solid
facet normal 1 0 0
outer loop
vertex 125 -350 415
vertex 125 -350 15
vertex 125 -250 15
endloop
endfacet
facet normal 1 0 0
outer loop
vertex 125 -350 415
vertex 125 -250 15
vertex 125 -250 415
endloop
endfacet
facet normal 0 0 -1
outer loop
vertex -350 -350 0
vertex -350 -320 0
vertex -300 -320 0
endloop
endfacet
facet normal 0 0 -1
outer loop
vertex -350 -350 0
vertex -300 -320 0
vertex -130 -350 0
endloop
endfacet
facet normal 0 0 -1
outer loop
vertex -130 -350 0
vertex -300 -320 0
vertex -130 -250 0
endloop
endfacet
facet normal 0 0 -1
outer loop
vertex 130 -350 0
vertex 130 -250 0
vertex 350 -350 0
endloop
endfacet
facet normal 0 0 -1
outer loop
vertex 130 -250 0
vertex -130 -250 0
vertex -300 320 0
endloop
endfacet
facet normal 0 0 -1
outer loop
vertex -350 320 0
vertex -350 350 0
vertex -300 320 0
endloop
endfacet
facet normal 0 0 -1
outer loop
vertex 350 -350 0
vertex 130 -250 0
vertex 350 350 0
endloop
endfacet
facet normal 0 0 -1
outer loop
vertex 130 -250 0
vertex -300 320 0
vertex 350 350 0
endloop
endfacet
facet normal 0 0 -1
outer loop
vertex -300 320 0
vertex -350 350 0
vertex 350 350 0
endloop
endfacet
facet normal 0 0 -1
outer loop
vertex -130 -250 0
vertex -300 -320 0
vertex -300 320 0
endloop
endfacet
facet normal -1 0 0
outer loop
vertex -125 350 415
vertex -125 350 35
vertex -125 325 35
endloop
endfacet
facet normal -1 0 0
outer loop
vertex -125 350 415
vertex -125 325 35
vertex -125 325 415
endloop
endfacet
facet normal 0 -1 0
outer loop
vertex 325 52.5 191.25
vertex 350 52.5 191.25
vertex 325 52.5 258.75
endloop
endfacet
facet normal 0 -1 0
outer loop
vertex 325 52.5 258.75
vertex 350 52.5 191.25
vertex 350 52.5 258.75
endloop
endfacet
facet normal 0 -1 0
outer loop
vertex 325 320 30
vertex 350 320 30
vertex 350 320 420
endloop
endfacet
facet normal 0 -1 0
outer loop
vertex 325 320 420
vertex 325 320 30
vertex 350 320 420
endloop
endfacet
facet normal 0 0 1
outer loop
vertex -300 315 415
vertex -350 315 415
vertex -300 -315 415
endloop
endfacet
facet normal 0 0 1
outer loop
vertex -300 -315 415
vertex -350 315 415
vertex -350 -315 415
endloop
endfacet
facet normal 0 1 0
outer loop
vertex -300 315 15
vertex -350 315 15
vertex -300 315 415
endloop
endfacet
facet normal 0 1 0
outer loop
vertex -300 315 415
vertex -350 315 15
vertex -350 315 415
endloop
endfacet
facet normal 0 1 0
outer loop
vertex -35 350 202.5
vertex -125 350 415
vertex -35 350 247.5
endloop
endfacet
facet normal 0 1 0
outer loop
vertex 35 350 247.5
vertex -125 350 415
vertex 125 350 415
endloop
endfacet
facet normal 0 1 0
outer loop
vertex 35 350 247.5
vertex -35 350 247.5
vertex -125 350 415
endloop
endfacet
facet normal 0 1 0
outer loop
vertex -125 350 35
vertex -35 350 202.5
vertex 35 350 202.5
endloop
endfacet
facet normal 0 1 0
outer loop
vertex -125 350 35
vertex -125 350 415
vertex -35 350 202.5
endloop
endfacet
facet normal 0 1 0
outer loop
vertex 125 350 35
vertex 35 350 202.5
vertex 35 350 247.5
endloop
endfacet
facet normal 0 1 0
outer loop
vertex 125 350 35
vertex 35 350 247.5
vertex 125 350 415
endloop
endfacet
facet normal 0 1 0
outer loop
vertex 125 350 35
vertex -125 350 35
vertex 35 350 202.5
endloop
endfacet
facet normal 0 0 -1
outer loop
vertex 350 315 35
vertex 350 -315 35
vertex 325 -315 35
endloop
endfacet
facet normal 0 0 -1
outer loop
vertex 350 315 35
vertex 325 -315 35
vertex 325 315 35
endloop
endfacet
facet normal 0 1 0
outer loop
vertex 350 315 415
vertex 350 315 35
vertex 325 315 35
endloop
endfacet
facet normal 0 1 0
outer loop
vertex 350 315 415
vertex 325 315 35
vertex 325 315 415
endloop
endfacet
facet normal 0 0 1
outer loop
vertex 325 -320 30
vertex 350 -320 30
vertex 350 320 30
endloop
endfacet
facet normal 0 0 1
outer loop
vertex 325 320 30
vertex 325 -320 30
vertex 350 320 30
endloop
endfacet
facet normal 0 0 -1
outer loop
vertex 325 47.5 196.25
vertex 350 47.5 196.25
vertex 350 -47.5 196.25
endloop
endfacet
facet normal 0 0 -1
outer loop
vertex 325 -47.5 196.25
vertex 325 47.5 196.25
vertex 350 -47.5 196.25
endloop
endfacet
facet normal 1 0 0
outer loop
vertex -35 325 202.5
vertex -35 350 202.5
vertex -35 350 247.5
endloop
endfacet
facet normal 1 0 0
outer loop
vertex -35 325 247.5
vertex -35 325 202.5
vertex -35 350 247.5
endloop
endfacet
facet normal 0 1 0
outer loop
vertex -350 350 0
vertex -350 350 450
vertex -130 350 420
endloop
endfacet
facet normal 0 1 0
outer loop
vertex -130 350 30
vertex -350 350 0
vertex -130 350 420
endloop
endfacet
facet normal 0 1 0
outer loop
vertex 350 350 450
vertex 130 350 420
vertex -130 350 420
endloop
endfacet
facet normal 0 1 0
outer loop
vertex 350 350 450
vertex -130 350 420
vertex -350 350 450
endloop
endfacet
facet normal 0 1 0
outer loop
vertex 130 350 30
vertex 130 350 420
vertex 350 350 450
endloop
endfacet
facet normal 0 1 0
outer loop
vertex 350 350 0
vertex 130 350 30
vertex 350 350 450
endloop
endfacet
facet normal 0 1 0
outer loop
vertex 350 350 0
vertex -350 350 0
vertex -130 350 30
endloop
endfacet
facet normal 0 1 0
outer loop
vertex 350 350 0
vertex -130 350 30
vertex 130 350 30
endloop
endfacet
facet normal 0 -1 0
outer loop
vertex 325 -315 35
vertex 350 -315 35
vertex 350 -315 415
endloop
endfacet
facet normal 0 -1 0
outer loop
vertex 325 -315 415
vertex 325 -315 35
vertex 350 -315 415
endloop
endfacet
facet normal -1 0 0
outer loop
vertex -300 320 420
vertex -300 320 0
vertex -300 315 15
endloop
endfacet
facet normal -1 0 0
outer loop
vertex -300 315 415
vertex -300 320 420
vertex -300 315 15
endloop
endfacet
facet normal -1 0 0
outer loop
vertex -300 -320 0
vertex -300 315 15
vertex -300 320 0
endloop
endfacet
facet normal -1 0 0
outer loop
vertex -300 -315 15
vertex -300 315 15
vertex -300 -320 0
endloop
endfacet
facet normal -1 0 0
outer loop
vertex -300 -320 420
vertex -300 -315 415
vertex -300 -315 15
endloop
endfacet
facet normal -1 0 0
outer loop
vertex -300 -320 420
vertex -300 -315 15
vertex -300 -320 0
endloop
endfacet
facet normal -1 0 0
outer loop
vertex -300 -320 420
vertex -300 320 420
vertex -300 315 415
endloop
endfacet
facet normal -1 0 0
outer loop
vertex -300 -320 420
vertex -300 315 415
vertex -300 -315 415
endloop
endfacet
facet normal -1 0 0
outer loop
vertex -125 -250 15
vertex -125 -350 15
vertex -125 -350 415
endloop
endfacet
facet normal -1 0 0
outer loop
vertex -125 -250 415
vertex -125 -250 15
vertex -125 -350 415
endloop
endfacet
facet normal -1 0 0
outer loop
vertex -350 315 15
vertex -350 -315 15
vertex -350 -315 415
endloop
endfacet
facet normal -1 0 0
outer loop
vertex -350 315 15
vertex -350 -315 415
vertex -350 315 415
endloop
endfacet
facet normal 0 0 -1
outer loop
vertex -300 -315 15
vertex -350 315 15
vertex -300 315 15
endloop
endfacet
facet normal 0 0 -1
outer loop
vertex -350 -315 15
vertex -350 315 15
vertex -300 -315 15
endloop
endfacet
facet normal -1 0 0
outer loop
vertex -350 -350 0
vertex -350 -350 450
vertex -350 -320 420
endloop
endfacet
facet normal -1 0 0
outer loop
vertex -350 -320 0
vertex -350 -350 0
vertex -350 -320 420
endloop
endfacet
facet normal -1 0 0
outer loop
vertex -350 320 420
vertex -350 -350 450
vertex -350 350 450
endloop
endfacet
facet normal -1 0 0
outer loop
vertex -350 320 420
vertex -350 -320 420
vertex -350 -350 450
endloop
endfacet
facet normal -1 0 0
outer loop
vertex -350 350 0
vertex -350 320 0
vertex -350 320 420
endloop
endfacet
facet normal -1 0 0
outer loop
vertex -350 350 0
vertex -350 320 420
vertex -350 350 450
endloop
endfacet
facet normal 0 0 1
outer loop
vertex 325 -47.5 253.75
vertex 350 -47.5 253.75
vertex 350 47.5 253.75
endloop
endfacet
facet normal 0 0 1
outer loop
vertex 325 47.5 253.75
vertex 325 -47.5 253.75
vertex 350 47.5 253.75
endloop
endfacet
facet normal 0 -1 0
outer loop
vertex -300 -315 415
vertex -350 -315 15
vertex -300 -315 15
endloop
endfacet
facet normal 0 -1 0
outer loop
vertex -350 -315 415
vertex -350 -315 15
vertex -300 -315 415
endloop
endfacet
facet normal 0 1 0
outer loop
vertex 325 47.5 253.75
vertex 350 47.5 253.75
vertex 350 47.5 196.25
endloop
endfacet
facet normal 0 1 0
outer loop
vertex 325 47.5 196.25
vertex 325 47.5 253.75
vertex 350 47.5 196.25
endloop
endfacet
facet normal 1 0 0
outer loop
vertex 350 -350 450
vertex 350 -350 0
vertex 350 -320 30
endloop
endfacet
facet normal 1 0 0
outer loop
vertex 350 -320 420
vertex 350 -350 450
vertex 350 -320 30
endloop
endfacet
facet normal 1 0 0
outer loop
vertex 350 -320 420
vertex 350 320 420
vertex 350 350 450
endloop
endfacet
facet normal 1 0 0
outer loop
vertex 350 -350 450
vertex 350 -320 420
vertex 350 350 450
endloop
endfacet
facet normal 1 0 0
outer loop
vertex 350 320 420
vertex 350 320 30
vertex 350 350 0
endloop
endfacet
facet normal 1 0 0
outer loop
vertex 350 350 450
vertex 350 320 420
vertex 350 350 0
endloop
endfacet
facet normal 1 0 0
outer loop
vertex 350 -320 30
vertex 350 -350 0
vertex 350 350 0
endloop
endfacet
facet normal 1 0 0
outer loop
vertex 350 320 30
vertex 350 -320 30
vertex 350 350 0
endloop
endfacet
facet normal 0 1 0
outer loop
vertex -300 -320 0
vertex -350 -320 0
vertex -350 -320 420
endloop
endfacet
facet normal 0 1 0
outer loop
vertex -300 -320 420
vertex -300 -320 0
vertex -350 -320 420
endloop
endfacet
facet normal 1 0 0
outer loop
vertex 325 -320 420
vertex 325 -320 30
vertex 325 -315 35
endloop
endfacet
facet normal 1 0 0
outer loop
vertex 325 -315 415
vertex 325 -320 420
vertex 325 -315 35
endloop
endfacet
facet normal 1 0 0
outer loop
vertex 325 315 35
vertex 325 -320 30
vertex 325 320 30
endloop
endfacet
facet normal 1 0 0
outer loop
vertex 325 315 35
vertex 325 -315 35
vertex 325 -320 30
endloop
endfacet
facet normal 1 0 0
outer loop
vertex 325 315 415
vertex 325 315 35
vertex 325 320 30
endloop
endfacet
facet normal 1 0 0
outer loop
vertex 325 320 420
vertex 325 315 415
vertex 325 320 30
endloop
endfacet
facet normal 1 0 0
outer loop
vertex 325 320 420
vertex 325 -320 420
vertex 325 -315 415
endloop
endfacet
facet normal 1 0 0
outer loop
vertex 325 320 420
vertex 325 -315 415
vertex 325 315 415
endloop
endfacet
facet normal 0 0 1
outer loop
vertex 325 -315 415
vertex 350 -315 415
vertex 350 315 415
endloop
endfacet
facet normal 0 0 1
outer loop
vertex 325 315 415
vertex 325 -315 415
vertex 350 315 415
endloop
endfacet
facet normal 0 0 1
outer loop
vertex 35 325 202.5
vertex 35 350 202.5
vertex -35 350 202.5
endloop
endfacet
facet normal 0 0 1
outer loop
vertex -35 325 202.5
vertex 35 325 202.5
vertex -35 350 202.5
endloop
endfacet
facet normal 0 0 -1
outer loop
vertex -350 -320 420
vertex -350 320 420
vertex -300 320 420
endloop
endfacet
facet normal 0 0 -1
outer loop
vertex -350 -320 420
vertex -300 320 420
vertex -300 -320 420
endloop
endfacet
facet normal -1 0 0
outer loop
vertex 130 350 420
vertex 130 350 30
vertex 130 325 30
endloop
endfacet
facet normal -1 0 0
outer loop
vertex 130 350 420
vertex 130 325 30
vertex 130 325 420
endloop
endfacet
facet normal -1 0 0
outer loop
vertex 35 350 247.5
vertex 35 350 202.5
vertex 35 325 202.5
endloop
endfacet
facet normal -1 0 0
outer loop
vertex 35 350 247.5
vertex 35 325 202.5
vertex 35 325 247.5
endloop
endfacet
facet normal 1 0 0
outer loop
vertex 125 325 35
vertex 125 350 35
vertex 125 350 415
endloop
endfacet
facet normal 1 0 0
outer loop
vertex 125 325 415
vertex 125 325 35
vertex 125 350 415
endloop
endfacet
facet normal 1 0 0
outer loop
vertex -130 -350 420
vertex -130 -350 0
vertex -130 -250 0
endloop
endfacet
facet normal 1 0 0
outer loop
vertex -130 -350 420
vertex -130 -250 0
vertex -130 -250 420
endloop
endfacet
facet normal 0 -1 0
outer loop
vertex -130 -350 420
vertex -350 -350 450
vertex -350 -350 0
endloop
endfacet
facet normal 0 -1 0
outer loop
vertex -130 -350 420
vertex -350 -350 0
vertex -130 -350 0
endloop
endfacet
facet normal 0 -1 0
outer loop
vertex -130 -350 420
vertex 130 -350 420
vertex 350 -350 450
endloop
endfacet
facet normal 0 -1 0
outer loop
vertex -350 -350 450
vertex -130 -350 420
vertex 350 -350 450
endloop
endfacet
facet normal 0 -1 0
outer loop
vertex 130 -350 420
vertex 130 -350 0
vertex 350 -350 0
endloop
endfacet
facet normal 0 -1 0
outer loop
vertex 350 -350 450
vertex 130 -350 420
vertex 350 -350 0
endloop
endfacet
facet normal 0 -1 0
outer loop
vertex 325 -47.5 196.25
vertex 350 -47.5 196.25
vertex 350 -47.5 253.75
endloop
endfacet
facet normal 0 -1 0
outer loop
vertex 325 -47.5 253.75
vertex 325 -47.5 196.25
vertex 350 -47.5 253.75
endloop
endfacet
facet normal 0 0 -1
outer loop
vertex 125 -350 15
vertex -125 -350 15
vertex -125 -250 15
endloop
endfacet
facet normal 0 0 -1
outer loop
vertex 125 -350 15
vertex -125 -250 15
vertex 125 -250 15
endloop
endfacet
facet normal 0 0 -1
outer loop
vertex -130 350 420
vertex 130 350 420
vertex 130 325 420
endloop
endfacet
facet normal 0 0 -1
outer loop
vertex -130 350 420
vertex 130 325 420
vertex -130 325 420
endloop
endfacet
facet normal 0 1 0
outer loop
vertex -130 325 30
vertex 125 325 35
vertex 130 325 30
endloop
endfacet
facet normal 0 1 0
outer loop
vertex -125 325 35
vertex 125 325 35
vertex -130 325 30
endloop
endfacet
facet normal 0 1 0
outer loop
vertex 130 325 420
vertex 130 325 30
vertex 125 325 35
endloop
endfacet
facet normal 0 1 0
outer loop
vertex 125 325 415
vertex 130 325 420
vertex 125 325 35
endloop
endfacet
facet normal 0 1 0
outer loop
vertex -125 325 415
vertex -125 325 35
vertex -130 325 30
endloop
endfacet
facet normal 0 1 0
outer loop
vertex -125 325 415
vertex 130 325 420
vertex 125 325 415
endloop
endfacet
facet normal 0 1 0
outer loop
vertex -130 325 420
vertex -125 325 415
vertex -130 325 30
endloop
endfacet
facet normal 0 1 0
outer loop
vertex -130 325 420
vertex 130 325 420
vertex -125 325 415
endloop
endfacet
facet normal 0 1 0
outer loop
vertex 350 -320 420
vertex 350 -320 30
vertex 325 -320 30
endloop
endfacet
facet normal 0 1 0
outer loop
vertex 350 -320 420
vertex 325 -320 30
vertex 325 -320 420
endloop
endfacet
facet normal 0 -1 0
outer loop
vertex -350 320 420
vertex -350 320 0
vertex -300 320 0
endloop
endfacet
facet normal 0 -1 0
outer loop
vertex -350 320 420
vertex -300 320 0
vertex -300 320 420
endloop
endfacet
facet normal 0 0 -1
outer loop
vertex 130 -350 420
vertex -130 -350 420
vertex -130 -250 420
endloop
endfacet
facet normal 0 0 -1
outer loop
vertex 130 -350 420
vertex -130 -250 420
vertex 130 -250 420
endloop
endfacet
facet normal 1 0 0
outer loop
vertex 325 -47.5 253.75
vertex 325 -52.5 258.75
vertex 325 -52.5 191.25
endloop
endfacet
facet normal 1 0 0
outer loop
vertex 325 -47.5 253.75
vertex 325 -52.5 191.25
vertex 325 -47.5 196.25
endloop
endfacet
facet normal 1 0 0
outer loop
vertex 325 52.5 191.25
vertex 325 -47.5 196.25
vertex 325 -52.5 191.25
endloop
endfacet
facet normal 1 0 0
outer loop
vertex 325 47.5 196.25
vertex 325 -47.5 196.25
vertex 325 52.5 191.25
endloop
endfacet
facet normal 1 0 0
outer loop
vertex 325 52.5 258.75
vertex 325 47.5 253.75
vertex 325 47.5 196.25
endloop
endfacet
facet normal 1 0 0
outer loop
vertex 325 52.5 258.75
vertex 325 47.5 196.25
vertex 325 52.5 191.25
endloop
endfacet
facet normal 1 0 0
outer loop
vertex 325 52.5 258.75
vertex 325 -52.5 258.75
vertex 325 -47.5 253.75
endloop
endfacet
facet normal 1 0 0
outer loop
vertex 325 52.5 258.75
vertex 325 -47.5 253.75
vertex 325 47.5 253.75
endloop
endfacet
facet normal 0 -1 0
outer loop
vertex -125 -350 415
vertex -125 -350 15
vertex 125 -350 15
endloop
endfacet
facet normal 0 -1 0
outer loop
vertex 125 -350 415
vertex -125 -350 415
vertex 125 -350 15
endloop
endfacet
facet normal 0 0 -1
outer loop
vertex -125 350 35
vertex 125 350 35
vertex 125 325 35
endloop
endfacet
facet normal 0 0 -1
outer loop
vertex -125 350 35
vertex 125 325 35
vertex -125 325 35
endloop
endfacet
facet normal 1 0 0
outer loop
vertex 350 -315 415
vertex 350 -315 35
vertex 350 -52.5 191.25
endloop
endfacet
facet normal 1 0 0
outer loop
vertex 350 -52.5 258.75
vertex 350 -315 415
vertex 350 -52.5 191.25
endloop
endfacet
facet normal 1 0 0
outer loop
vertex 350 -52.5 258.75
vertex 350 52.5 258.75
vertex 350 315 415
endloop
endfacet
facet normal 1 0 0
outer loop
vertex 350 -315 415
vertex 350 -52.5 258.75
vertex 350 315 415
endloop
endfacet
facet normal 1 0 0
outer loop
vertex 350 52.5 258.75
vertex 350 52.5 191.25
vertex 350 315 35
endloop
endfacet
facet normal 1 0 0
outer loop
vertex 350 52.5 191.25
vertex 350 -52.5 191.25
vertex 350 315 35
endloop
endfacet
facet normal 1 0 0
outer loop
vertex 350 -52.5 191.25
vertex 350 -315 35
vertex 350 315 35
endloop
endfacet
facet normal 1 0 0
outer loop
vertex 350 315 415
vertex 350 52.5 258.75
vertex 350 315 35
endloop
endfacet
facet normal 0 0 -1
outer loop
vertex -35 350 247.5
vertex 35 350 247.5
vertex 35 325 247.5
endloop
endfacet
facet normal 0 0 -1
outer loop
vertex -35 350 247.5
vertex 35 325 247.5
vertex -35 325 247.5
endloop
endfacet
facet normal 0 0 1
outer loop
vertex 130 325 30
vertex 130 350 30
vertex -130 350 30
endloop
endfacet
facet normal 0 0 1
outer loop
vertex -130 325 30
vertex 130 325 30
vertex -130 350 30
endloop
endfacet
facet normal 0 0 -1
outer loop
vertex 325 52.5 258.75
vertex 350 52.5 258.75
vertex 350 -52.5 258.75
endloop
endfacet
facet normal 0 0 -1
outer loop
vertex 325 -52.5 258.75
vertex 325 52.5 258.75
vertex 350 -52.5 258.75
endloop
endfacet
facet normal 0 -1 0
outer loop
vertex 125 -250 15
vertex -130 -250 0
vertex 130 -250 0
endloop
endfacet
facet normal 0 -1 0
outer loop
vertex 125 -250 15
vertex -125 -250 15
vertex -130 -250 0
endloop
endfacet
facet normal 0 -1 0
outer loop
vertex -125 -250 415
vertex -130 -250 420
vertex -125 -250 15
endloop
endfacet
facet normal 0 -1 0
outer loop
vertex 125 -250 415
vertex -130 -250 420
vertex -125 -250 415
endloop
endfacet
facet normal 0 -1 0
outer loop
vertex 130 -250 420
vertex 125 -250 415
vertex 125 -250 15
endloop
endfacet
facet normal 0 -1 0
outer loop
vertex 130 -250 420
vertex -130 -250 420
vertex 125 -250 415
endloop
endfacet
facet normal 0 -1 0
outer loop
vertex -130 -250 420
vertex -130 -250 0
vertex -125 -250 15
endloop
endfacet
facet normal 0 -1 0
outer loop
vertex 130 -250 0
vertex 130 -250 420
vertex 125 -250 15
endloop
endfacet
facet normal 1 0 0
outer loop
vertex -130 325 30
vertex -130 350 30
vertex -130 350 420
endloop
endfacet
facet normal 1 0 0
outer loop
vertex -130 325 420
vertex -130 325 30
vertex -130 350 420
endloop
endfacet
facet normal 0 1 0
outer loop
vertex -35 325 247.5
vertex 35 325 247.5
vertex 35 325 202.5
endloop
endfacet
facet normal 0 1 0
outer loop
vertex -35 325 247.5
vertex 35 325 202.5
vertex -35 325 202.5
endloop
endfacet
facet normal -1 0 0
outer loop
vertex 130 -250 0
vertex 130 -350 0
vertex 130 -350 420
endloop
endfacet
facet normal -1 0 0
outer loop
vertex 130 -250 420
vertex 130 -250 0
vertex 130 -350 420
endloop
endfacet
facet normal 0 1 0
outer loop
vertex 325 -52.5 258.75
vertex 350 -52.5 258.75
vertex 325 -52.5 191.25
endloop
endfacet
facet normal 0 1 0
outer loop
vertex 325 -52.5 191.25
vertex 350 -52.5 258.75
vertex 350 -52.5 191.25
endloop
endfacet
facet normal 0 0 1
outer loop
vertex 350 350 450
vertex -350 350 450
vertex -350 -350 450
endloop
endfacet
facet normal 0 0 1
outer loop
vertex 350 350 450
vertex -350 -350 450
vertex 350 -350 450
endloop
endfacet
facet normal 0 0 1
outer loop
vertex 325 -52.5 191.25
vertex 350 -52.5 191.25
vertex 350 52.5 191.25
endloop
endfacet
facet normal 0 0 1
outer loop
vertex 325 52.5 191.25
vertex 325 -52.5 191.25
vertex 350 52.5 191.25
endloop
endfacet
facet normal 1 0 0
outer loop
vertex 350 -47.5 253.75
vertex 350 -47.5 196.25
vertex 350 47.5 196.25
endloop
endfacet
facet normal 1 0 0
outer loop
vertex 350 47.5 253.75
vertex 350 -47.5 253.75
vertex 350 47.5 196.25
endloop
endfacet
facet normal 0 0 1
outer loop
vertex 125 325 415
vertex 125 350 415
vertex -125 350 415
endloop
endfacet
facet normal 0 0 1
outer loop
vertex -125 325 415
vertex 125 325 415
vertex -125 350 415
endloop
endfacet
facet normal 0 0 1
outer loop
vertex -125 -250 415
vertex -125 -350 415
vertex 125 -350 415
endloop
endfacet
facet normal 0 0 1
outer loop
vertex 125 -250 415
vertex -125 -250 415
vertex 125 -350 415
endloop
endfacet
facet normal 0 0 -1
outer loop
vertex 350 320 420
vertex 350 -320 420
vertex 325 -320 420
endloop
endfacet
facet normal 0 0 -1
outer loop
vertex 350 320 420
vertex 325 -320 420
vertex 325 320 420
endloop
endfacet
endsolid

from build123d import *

# Parameters (mm, degrees)
F0_W      = 700
F0_H      = 700
F1_DEPTH  = 450
F2_W      = 640
F2_H      = 390
F2_W_2    = 630
F2_H_2    = 380
F3_DEPTH  = 25
F4_W      = 260
F4_H      = 390
F4_W_2    = 250
F4_H_2    = 380
F5_DEPTH  = 25
F7_DEPTH  = 25
F4_W_3    = 70
F4_H_3    = 45
F8_DEPTH  = 25
F9_W      = 640
F9_H      = 420
F9_W_2    = 630
F9_H_2    = 400
F10_DEPTH = 50
F12_W     = 260
F12_H     = 420
F12_W_2   = 250
F12_H_2   = 400
F13_DEPTH = 100


with BuildPart() as f1:
    # F0 (on Top) → F1 (new body)
    with BuildSketch(Plane.XY):
        Rectangle(F0_W, F0_H)
    extrude(amount=F1_DEPTH)

    # F2 (on face) → F3 (cut)
    with BuildSketch(Plane.YZ.offset(350)):
        with Locations((0, 225)):
            Rectangle(F2_W, F2_H)
        with Locations((0, 225)):
            Rectangle(F2_W_2, F2_H_2, mode=Mode.SUBTRACT)
    extrude(amount=-F3_DEPTH, mode=Mode.SUBTRACT)

    # F4 (on face) → F5 (cut)
    with BuildSketch(Plane(origin=(0, 350, 0), x_dir=(-1, 0, 0), z_dir=(0, 1, 0))):
        with Locations((0, 225)):
            Rectangle(F4_W, F4_H)
        with Locations((0, 225)):
            Rectangle(F4_W_2, F4_H_2, mode=Mode.SUBTRACT)
    extrude(amount=-F5_DEPTH, mode=Mode.SUBTRACT)

    # F6 (on face) → F7 (cut)
    with BuildSketch(Plane.YZ.offset(350)):
        Polygon((52.5, 258.75), (-52.5, 258.75), (-52.5, 225), (-47.5, 225), (-47.5, 253.75), (47.5, 253.75), (47.5, 225), (52.5, 225), align=None)
        Polygon((-47.5, 225), (-52.5, 225), (-52.5, 191.25), (52.5, 191.25), (52.5, 225), (47.5, 225), (47.5, 196.25), (-47.5, 196.25), align=None)
    extrude(amount=-F7_DEPTH, mode=Mode.SUBTRACT)

    # F4 (on face) → F8 (cut)
    with BuildSketch(Plane(origin=(0, 350, 0), x_dir=(-1, 0, 0), z_dir=(0, 1, 0))):
        with Locations((0, 225)):
            Rectangle(F4_W_3, F4_H_3)
    extrude(amount=-F8_DEPTH, mode=Mode.SUBTRACT)

    # F9 (on face) → F10 (cut)
    with BuildSketch(Plane(origin=(-350, 0, 0), x_dir=(0, -1, 0), z_dir=(-1, 0, 0))):
        with Locations((0, 210)):
            Rectangle(F9_W, F9_H)
        with Locations((0, 215)):
            Rectangle(F9_W_2, F9_H_2, mode=Mode.SUBTRACT)
    extrude(amount=-F10_DEPTH, mode=Mode.SUBTRACT)

    # F12 (on face) → F13 (cut)
    with BuildSketch(Plane.XZ.offset(350)):
        with Locations((0, 210)):
            Rectangle(F12_W, F12_H)
        with Locations((0, 215)):
            Rectangle(F12_W_2, F12_H_2, mode=Mode.SUBTRACT)
    extrude(amount=-F13_DEPTH, mode=Mode.SUBTRACT)


solid = f1.part
